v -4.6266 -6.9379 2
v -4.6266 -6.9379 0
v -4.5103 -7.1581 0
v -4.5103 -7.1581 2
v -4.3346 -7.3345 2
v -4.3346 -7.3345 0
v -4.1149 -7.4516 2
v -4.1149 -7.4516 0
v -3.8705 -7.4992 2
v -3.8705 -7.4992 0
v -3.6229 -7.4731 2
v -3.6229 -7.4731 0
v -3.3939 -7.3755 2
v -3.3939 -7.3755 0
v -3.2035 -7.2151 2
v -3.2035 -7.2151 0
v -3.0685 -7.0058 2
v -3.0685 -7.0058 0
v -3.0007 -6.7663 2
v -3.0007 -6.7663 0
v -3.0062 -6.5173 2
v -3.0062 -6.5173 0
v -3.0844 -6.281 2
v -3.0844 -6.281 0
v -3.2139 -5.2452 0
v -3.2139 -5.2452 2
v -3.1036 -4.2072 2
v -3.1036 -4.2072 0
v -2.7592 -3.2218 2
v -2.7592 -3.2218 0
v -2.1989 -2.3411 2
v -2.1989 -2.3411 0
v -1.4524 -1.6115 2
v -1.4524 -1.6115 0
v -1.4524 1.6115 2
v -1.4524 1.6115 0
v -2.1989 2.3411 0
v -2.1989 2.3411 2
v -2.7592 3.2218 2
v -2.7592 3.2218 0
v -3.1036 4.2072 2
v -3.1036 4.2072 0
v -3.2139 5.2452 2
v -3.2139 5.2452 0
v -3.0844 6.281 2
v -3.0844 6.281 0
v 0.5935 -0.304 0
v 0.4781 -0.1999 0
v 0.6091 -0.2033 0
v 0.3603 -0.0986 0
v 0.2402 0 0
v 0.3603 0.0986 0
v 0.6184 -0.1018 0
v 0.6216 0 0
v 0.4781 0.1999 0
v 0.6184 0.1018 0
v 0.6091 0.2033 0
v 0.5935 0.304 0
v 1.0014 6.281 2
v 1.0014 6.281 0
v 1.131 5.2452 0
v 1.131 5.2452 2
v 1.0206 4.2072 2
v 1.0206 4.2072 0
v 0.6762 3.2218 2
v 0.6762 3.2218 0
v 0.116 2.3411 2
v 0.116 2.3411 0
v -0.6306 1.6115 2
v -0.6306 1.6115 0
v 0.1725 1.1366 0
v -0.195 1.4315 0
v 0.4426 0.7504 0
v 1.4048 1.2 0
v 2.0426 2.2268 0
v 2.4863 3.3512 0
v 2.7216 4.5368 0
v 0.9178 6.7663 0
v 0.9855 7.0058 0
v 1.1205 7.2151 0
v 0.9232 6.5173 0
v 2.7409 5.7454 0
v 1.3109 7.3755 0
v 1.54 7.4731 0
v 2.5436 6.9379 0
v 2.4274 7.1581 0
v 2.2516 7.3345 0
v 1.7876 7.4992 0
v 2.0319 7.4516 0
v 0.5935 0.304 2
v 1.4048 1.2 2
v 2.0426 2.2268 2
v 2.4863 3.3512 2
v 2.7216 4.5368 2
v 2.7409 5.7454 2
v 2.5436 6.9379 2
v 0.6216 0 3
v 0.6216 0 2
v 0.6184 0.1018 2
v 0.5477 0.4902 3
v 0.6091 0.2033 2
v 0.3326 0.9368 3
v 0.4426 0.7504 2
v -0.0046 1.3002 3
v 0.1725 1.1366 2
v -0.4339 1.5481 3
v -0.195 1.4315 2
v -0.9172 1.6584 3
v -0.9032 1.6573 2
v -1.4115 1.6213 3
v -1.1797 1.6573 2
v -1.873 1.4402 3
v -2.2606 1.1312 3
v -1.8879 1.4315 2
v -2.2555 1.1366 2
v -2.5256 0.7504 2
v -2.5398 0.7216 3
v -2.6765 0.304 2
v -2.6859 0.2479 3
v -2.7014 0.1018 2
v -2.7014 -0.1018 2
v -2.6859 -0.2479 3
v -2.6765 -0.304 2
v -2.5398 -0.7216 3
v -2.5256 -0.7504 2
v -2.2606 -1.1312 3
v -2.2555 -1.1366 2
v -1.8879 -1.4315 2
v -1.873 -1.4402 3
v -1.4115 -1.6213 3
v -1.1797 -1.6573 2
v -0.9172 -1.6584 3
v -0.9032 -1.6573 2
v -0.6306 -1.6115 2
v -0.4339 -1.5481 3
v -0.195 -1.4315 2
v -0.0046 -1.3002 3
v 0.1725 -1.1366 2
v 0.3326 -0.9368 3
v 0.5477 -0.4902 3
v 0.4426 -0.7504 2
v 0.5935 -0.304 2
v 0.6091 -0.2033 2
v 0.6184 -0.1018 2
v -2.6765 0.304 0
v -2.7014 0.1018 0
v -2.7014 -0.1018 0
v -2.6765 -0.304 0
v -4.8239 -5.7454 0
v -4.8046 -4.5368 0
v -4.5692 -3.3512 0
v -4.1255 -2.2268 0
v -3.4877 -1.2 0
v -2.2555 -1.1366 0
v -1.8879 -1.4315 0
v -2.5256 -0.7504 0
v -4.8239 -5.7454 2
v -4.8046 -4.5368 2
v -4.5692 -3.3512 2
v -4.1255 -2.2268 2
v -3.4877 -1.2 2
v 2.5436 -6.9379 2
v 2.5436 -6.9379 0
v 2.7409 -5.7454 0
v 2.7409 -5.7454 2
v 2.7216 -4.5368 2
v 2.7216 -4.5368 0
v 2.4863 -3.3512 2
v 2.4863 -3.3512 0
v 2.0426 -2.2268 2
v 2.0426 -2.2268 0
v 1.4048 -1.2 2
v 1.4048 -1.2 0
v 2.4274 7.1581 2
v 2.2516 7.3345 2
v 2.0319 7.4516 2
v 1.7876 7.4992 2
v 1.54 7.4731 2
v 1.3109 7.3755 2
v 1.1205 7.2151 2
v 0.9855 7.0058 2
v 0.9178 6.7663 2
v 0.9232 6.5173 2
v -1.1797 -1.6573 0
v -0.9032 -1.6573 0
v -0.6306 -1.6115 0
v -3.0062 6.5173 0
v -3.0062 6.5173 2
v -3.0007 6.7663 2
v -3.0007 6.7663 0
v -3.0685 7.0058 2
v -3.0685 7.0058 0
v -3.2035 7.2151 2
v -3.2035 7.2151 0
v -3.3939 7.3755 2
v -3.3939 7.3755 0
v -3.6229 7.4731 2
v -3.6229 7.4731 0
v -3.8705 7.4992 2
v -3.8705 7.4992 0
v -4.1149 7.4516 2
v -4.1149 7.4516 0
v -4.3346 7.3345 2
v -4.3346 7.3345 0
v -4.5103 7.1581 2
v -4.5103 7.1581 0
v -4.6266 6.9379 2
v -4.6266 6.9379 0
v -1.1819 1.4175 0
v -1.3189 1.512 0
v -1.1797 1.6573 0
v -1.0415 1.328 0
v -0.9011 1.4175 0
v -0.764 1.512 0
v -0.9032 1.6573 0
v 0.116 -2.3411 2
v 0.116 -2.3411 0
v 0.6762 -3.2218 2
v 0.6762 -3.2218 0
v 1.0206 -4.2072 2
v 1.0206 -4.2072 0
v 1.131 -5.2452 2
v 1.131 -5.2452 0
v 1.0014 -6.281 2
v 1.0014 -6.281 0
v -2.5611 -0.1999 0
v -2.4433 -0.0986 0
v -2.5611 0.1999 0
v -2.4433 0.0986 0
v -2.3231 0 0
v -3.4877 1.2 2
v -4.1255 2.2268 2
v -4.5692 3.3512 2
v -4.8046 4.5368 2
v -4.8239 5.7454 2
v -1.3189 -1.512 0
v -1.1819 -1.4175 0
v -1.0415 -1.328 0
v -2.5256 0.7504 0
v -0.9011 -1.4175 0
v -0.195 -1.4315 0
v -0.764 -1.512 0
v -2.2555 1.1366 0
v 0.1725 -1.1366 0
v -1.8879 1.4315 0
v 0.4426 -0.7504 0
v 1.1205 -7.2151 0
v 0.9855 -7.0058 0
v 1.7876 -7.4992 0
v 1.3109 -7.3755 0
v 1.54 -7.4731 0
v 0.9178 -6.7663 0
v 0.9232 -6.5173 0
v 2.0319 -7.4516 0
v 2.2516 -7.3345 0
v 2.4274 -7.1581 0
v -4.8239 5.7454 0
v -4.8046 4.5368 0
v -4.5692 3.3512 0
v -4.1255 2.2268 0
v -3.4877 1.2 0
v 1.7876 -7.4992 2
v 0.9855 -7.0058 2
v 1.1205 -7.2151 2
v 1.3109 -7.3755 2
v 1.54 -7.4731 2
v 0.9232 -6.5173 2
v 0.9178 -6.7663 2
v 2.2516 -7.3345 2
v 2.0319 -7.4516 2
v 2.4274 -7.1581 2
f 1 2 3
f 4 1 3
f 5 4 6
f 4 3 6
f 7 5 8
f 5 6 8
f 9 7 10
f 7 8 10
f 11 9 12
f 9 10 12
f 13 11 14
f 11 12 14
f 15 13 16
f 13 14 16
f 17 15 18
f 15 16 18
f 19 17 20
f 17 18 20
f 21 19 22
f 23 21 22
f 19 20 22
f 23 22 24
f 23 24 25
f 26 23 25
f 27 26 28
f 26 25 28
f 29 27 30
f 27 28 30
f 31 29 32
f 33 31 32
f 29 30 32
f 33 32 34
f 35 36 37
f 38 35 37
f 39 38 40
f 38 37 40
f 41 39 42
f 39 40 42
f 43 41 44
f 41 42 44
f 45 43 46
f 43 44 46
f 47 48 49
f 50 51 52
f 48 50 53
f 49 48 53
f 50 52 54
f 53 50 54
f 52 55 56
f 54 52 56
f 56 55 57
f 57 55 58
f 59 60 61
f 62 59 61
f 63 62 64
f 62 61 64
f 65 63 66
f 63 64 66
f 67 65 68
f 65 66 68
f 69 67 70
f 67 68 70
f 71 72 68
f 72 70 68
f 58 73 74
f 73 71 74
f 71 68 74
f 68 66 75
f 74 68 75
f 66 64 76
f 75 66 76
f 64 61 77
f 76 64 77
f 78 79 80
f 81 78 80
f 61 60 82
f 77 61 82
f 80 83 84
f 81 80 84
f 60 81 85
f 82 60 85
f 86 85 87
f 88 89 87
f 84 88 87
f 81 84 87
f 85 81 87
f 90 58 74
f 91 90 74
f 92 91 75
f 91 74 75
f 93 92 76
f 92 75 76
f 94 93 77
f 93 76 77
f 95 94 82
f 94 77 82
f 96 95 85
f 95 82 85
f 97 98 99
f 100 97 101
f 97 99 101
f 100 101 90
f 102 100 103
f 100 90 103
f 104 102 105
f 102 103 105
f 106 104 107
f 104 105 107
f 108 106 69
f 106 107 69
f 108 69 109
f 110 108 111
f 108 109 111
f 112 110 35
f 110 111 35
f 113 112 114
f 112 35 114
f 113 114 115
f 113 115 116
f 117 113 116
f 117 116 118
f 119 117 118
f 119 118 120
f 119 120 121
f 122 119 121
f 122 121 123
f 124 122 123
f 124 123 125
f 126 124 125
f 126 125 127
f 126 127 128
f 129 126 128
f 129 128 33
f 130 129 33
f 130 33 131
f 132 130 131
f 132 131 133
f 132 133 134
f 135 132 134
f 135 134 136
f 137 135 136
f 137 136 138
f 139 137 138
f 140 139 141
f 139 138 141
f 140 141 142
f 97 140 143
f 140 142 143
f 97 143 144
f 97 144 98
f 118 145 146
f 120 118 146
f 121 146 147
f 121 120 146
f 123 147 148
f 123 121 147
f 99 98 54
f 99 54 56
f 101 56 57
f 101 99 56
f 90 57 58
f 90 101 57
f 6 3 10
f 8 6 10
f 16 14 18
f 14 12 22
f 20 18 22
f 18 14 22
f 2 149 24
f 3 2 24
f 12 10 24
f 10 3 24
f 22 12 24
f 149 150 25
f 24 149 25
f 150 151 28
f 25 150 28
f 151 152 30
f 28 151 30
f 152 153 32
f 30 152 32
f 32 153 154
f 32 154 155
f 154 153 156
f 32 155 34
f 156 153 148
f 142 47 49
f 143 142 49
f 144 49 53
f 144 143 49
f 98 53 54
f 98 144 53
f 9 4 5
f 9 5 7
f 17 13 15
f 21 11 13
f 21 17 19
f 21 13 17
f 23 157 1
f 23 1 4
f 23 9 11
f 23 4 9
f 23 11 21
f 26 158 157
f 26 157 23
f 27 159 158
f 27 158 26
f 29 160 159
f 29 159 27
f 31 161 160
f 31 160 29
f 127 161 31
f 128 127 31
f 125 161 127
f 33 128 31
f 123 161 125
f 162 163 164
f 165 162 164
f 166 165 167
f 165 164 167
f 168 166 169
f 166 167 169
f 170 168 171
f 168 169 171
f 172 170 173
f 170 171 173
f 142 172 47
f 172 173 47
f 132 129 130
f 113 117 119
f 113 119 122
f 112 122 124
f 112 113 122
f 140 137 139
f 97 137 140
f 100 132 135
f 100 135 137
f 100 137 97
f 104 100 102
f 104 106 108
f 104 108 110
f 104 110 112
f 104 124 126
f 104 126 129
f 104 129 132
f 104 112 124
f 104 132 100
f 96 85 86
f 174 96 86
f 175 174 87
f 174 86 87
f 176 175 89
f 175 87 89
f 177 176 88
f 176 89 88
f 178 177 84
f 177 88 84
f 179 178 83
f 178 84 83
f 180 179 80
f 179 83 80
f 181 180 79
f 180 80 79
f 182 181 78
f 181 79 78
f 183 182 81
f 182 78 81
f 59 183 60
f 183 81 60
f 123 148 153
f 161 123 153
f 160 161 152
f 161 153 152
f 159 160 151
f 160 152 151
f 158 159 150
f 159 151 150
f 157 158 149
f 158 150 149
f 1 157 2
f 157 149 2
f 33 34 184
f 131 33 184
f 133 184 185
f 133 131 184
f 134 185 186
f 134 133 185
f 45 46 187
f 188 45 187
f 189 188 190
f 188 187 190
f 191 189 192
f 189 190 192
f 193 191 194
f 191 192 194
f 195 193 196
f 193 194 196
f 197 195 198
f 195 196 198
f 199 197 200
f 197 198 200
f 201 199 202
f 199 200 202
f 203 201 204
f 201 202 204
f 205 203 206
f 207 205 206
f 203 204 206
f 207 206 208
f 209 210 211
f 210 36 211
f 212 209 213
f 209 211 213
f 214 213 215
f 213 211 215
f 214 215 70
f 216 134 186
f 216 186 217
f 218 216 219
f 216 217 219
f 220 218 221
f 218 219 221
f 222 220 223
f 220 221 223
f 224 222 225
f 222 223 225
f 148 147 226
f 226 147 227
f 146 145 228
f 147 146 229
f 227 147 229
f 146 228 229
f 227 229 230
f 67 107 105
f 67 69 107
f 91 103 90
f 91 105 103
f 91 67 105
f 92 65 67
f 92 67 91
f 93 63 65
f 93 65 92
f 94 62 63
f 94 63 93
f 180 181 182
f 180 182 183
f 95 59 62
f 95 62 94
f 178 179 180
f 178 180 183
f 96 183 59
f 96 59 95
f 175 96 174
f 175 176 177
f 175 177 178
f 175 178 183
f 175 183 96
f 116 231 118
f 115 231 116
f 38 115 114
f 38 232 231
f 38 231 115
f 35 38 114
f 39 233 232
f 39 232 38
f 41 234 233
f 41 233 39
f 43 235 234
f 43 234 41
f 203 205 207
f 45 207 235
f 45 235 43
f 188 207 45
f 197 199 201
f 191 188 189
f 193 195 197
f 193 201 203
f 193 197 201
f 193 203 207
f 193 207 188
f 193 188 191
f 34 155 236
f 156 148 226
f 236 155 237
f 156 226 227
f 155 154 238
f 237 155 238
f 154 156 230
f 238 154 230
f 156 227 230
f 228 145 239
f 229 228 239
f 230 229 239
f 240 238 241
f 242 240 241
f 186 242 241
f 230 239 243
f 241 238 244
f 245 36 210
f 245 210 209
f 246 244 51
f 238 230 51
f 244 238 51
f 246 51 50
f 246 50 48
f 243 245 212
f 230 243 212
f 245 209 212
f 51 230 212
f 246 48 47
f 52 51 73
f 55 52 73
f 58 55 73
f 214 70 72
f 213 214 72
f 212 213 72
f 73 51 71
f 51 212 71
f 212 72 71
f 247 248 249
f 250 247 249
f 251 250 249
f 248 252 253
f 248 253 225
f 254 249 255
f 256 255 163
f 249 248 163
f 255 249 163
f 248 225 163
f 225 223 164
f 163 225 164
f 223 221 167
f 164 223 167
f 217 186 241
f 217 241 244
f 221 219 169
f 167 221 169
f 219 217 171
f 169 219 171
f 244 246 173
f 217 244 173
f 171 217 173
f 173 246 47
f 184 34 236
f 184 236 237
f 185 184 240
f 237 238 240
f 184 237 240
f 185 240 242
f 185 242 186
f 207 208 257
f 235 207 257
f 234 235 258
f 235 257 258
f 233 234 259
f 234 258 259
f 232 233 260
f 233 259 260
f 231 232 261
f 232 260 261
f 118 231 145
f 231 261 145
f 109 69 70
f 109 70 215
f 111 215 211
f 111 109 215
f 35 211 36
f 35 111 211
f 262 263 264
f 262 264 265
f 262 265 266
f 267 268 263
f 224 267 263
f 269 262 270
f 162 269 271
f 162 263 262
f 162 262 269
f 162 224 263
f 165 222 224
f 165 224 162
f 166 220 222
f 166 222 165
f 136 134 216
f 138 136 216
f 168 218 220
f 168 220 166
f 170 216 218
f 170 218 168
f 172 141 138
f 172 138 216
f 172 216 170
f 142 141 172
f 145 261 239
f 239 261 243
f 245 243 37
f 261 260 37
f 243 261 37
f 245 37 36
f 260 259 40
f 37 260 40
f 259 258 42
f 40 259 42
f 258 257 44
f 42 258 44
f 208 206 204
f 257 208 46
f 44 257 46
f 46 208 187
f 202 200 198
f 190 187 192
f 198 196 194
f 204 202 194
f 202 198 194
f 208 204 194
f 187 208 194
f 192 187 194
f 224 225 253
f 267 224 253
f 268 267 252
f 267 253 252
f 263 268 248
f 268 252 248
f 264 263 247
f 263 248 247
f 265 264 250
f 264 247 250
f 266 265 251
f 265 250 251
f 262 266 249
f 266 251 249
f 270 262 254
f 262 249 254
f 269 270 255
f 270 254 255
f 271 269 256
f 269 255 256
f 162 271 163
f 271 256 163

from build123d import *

# Parameters (mm, degrees)
F1_DEPTH      = 2
F2_R          = 1.663036
F3_DEPTH      = 1
F3_DEPTH_BACK = 2


with BuildPart() as f1:
    # F0 (on Top) → F1 (new body)
    with BuildSketch(Plane.XY):
        with BuildLine():
            ThreePointArc((1.001429, 6.28096), (0.788002, 3.471218), (-1.041486, 1.328047))
            ThreePointArc((-1.041486, 1.328047), (-2.870973, 3.471218), (-3.0844, 6.28096))
            ThreePointArc((-3.0844, 6.28096), (-3.50476, 7.432811), (-4.6266, 6.937897))
            ThreePointArc((-4.6266, 6.937897), (-4.499632, 3.128719), (-2.323149, 0))
            ThreePointArc((-2.323149, 0), (-4.499632, -3.128719), (-4.6266, -6.937897))
            ThreePointArc((-4.6266, -6.937897), (-3.50476, -7.432811), (-3.0844, -6.28096))
            ThreePointArc((-3.0844, -6.28096), (-2.870973, -3.471218), (-1.041486, -1.328047))
            ThreePointArc((-1.041486, -1.328047), (0.788002, -3.471218), (1.001429, -6.28096))
            ThreePointArc((1.001429, -6.28096), (1.421789, -7.432811), (2.543628, -6.937897))
            ThreePointArc((2.543628, -6.937897), (2.416661, -3.128719), (0.240178, 0))
            ThreePointArc((0.240178, 0), (2.416661, 3.128719), (2.543628, 6.937897))
            ThreePointArc((2.543628, 6.937897), (1.421789, 7.432811), (1.001429, 6.28096))
        make_face()
    extrude(amount=F1_DEPTH)

    # F2 (on face) → F3 (join, two sides)
    with BuildSketch(Plane.XY.offset(2)) as f3_sk:
        with Locations((-1.041486, 0)):
            Circle(F2_R)
    extrude(amount=F3_DEPTH)
    extrude(f3_sk.sketch, amount=-F3_DEPTH_BACK)


solid = f1.part
